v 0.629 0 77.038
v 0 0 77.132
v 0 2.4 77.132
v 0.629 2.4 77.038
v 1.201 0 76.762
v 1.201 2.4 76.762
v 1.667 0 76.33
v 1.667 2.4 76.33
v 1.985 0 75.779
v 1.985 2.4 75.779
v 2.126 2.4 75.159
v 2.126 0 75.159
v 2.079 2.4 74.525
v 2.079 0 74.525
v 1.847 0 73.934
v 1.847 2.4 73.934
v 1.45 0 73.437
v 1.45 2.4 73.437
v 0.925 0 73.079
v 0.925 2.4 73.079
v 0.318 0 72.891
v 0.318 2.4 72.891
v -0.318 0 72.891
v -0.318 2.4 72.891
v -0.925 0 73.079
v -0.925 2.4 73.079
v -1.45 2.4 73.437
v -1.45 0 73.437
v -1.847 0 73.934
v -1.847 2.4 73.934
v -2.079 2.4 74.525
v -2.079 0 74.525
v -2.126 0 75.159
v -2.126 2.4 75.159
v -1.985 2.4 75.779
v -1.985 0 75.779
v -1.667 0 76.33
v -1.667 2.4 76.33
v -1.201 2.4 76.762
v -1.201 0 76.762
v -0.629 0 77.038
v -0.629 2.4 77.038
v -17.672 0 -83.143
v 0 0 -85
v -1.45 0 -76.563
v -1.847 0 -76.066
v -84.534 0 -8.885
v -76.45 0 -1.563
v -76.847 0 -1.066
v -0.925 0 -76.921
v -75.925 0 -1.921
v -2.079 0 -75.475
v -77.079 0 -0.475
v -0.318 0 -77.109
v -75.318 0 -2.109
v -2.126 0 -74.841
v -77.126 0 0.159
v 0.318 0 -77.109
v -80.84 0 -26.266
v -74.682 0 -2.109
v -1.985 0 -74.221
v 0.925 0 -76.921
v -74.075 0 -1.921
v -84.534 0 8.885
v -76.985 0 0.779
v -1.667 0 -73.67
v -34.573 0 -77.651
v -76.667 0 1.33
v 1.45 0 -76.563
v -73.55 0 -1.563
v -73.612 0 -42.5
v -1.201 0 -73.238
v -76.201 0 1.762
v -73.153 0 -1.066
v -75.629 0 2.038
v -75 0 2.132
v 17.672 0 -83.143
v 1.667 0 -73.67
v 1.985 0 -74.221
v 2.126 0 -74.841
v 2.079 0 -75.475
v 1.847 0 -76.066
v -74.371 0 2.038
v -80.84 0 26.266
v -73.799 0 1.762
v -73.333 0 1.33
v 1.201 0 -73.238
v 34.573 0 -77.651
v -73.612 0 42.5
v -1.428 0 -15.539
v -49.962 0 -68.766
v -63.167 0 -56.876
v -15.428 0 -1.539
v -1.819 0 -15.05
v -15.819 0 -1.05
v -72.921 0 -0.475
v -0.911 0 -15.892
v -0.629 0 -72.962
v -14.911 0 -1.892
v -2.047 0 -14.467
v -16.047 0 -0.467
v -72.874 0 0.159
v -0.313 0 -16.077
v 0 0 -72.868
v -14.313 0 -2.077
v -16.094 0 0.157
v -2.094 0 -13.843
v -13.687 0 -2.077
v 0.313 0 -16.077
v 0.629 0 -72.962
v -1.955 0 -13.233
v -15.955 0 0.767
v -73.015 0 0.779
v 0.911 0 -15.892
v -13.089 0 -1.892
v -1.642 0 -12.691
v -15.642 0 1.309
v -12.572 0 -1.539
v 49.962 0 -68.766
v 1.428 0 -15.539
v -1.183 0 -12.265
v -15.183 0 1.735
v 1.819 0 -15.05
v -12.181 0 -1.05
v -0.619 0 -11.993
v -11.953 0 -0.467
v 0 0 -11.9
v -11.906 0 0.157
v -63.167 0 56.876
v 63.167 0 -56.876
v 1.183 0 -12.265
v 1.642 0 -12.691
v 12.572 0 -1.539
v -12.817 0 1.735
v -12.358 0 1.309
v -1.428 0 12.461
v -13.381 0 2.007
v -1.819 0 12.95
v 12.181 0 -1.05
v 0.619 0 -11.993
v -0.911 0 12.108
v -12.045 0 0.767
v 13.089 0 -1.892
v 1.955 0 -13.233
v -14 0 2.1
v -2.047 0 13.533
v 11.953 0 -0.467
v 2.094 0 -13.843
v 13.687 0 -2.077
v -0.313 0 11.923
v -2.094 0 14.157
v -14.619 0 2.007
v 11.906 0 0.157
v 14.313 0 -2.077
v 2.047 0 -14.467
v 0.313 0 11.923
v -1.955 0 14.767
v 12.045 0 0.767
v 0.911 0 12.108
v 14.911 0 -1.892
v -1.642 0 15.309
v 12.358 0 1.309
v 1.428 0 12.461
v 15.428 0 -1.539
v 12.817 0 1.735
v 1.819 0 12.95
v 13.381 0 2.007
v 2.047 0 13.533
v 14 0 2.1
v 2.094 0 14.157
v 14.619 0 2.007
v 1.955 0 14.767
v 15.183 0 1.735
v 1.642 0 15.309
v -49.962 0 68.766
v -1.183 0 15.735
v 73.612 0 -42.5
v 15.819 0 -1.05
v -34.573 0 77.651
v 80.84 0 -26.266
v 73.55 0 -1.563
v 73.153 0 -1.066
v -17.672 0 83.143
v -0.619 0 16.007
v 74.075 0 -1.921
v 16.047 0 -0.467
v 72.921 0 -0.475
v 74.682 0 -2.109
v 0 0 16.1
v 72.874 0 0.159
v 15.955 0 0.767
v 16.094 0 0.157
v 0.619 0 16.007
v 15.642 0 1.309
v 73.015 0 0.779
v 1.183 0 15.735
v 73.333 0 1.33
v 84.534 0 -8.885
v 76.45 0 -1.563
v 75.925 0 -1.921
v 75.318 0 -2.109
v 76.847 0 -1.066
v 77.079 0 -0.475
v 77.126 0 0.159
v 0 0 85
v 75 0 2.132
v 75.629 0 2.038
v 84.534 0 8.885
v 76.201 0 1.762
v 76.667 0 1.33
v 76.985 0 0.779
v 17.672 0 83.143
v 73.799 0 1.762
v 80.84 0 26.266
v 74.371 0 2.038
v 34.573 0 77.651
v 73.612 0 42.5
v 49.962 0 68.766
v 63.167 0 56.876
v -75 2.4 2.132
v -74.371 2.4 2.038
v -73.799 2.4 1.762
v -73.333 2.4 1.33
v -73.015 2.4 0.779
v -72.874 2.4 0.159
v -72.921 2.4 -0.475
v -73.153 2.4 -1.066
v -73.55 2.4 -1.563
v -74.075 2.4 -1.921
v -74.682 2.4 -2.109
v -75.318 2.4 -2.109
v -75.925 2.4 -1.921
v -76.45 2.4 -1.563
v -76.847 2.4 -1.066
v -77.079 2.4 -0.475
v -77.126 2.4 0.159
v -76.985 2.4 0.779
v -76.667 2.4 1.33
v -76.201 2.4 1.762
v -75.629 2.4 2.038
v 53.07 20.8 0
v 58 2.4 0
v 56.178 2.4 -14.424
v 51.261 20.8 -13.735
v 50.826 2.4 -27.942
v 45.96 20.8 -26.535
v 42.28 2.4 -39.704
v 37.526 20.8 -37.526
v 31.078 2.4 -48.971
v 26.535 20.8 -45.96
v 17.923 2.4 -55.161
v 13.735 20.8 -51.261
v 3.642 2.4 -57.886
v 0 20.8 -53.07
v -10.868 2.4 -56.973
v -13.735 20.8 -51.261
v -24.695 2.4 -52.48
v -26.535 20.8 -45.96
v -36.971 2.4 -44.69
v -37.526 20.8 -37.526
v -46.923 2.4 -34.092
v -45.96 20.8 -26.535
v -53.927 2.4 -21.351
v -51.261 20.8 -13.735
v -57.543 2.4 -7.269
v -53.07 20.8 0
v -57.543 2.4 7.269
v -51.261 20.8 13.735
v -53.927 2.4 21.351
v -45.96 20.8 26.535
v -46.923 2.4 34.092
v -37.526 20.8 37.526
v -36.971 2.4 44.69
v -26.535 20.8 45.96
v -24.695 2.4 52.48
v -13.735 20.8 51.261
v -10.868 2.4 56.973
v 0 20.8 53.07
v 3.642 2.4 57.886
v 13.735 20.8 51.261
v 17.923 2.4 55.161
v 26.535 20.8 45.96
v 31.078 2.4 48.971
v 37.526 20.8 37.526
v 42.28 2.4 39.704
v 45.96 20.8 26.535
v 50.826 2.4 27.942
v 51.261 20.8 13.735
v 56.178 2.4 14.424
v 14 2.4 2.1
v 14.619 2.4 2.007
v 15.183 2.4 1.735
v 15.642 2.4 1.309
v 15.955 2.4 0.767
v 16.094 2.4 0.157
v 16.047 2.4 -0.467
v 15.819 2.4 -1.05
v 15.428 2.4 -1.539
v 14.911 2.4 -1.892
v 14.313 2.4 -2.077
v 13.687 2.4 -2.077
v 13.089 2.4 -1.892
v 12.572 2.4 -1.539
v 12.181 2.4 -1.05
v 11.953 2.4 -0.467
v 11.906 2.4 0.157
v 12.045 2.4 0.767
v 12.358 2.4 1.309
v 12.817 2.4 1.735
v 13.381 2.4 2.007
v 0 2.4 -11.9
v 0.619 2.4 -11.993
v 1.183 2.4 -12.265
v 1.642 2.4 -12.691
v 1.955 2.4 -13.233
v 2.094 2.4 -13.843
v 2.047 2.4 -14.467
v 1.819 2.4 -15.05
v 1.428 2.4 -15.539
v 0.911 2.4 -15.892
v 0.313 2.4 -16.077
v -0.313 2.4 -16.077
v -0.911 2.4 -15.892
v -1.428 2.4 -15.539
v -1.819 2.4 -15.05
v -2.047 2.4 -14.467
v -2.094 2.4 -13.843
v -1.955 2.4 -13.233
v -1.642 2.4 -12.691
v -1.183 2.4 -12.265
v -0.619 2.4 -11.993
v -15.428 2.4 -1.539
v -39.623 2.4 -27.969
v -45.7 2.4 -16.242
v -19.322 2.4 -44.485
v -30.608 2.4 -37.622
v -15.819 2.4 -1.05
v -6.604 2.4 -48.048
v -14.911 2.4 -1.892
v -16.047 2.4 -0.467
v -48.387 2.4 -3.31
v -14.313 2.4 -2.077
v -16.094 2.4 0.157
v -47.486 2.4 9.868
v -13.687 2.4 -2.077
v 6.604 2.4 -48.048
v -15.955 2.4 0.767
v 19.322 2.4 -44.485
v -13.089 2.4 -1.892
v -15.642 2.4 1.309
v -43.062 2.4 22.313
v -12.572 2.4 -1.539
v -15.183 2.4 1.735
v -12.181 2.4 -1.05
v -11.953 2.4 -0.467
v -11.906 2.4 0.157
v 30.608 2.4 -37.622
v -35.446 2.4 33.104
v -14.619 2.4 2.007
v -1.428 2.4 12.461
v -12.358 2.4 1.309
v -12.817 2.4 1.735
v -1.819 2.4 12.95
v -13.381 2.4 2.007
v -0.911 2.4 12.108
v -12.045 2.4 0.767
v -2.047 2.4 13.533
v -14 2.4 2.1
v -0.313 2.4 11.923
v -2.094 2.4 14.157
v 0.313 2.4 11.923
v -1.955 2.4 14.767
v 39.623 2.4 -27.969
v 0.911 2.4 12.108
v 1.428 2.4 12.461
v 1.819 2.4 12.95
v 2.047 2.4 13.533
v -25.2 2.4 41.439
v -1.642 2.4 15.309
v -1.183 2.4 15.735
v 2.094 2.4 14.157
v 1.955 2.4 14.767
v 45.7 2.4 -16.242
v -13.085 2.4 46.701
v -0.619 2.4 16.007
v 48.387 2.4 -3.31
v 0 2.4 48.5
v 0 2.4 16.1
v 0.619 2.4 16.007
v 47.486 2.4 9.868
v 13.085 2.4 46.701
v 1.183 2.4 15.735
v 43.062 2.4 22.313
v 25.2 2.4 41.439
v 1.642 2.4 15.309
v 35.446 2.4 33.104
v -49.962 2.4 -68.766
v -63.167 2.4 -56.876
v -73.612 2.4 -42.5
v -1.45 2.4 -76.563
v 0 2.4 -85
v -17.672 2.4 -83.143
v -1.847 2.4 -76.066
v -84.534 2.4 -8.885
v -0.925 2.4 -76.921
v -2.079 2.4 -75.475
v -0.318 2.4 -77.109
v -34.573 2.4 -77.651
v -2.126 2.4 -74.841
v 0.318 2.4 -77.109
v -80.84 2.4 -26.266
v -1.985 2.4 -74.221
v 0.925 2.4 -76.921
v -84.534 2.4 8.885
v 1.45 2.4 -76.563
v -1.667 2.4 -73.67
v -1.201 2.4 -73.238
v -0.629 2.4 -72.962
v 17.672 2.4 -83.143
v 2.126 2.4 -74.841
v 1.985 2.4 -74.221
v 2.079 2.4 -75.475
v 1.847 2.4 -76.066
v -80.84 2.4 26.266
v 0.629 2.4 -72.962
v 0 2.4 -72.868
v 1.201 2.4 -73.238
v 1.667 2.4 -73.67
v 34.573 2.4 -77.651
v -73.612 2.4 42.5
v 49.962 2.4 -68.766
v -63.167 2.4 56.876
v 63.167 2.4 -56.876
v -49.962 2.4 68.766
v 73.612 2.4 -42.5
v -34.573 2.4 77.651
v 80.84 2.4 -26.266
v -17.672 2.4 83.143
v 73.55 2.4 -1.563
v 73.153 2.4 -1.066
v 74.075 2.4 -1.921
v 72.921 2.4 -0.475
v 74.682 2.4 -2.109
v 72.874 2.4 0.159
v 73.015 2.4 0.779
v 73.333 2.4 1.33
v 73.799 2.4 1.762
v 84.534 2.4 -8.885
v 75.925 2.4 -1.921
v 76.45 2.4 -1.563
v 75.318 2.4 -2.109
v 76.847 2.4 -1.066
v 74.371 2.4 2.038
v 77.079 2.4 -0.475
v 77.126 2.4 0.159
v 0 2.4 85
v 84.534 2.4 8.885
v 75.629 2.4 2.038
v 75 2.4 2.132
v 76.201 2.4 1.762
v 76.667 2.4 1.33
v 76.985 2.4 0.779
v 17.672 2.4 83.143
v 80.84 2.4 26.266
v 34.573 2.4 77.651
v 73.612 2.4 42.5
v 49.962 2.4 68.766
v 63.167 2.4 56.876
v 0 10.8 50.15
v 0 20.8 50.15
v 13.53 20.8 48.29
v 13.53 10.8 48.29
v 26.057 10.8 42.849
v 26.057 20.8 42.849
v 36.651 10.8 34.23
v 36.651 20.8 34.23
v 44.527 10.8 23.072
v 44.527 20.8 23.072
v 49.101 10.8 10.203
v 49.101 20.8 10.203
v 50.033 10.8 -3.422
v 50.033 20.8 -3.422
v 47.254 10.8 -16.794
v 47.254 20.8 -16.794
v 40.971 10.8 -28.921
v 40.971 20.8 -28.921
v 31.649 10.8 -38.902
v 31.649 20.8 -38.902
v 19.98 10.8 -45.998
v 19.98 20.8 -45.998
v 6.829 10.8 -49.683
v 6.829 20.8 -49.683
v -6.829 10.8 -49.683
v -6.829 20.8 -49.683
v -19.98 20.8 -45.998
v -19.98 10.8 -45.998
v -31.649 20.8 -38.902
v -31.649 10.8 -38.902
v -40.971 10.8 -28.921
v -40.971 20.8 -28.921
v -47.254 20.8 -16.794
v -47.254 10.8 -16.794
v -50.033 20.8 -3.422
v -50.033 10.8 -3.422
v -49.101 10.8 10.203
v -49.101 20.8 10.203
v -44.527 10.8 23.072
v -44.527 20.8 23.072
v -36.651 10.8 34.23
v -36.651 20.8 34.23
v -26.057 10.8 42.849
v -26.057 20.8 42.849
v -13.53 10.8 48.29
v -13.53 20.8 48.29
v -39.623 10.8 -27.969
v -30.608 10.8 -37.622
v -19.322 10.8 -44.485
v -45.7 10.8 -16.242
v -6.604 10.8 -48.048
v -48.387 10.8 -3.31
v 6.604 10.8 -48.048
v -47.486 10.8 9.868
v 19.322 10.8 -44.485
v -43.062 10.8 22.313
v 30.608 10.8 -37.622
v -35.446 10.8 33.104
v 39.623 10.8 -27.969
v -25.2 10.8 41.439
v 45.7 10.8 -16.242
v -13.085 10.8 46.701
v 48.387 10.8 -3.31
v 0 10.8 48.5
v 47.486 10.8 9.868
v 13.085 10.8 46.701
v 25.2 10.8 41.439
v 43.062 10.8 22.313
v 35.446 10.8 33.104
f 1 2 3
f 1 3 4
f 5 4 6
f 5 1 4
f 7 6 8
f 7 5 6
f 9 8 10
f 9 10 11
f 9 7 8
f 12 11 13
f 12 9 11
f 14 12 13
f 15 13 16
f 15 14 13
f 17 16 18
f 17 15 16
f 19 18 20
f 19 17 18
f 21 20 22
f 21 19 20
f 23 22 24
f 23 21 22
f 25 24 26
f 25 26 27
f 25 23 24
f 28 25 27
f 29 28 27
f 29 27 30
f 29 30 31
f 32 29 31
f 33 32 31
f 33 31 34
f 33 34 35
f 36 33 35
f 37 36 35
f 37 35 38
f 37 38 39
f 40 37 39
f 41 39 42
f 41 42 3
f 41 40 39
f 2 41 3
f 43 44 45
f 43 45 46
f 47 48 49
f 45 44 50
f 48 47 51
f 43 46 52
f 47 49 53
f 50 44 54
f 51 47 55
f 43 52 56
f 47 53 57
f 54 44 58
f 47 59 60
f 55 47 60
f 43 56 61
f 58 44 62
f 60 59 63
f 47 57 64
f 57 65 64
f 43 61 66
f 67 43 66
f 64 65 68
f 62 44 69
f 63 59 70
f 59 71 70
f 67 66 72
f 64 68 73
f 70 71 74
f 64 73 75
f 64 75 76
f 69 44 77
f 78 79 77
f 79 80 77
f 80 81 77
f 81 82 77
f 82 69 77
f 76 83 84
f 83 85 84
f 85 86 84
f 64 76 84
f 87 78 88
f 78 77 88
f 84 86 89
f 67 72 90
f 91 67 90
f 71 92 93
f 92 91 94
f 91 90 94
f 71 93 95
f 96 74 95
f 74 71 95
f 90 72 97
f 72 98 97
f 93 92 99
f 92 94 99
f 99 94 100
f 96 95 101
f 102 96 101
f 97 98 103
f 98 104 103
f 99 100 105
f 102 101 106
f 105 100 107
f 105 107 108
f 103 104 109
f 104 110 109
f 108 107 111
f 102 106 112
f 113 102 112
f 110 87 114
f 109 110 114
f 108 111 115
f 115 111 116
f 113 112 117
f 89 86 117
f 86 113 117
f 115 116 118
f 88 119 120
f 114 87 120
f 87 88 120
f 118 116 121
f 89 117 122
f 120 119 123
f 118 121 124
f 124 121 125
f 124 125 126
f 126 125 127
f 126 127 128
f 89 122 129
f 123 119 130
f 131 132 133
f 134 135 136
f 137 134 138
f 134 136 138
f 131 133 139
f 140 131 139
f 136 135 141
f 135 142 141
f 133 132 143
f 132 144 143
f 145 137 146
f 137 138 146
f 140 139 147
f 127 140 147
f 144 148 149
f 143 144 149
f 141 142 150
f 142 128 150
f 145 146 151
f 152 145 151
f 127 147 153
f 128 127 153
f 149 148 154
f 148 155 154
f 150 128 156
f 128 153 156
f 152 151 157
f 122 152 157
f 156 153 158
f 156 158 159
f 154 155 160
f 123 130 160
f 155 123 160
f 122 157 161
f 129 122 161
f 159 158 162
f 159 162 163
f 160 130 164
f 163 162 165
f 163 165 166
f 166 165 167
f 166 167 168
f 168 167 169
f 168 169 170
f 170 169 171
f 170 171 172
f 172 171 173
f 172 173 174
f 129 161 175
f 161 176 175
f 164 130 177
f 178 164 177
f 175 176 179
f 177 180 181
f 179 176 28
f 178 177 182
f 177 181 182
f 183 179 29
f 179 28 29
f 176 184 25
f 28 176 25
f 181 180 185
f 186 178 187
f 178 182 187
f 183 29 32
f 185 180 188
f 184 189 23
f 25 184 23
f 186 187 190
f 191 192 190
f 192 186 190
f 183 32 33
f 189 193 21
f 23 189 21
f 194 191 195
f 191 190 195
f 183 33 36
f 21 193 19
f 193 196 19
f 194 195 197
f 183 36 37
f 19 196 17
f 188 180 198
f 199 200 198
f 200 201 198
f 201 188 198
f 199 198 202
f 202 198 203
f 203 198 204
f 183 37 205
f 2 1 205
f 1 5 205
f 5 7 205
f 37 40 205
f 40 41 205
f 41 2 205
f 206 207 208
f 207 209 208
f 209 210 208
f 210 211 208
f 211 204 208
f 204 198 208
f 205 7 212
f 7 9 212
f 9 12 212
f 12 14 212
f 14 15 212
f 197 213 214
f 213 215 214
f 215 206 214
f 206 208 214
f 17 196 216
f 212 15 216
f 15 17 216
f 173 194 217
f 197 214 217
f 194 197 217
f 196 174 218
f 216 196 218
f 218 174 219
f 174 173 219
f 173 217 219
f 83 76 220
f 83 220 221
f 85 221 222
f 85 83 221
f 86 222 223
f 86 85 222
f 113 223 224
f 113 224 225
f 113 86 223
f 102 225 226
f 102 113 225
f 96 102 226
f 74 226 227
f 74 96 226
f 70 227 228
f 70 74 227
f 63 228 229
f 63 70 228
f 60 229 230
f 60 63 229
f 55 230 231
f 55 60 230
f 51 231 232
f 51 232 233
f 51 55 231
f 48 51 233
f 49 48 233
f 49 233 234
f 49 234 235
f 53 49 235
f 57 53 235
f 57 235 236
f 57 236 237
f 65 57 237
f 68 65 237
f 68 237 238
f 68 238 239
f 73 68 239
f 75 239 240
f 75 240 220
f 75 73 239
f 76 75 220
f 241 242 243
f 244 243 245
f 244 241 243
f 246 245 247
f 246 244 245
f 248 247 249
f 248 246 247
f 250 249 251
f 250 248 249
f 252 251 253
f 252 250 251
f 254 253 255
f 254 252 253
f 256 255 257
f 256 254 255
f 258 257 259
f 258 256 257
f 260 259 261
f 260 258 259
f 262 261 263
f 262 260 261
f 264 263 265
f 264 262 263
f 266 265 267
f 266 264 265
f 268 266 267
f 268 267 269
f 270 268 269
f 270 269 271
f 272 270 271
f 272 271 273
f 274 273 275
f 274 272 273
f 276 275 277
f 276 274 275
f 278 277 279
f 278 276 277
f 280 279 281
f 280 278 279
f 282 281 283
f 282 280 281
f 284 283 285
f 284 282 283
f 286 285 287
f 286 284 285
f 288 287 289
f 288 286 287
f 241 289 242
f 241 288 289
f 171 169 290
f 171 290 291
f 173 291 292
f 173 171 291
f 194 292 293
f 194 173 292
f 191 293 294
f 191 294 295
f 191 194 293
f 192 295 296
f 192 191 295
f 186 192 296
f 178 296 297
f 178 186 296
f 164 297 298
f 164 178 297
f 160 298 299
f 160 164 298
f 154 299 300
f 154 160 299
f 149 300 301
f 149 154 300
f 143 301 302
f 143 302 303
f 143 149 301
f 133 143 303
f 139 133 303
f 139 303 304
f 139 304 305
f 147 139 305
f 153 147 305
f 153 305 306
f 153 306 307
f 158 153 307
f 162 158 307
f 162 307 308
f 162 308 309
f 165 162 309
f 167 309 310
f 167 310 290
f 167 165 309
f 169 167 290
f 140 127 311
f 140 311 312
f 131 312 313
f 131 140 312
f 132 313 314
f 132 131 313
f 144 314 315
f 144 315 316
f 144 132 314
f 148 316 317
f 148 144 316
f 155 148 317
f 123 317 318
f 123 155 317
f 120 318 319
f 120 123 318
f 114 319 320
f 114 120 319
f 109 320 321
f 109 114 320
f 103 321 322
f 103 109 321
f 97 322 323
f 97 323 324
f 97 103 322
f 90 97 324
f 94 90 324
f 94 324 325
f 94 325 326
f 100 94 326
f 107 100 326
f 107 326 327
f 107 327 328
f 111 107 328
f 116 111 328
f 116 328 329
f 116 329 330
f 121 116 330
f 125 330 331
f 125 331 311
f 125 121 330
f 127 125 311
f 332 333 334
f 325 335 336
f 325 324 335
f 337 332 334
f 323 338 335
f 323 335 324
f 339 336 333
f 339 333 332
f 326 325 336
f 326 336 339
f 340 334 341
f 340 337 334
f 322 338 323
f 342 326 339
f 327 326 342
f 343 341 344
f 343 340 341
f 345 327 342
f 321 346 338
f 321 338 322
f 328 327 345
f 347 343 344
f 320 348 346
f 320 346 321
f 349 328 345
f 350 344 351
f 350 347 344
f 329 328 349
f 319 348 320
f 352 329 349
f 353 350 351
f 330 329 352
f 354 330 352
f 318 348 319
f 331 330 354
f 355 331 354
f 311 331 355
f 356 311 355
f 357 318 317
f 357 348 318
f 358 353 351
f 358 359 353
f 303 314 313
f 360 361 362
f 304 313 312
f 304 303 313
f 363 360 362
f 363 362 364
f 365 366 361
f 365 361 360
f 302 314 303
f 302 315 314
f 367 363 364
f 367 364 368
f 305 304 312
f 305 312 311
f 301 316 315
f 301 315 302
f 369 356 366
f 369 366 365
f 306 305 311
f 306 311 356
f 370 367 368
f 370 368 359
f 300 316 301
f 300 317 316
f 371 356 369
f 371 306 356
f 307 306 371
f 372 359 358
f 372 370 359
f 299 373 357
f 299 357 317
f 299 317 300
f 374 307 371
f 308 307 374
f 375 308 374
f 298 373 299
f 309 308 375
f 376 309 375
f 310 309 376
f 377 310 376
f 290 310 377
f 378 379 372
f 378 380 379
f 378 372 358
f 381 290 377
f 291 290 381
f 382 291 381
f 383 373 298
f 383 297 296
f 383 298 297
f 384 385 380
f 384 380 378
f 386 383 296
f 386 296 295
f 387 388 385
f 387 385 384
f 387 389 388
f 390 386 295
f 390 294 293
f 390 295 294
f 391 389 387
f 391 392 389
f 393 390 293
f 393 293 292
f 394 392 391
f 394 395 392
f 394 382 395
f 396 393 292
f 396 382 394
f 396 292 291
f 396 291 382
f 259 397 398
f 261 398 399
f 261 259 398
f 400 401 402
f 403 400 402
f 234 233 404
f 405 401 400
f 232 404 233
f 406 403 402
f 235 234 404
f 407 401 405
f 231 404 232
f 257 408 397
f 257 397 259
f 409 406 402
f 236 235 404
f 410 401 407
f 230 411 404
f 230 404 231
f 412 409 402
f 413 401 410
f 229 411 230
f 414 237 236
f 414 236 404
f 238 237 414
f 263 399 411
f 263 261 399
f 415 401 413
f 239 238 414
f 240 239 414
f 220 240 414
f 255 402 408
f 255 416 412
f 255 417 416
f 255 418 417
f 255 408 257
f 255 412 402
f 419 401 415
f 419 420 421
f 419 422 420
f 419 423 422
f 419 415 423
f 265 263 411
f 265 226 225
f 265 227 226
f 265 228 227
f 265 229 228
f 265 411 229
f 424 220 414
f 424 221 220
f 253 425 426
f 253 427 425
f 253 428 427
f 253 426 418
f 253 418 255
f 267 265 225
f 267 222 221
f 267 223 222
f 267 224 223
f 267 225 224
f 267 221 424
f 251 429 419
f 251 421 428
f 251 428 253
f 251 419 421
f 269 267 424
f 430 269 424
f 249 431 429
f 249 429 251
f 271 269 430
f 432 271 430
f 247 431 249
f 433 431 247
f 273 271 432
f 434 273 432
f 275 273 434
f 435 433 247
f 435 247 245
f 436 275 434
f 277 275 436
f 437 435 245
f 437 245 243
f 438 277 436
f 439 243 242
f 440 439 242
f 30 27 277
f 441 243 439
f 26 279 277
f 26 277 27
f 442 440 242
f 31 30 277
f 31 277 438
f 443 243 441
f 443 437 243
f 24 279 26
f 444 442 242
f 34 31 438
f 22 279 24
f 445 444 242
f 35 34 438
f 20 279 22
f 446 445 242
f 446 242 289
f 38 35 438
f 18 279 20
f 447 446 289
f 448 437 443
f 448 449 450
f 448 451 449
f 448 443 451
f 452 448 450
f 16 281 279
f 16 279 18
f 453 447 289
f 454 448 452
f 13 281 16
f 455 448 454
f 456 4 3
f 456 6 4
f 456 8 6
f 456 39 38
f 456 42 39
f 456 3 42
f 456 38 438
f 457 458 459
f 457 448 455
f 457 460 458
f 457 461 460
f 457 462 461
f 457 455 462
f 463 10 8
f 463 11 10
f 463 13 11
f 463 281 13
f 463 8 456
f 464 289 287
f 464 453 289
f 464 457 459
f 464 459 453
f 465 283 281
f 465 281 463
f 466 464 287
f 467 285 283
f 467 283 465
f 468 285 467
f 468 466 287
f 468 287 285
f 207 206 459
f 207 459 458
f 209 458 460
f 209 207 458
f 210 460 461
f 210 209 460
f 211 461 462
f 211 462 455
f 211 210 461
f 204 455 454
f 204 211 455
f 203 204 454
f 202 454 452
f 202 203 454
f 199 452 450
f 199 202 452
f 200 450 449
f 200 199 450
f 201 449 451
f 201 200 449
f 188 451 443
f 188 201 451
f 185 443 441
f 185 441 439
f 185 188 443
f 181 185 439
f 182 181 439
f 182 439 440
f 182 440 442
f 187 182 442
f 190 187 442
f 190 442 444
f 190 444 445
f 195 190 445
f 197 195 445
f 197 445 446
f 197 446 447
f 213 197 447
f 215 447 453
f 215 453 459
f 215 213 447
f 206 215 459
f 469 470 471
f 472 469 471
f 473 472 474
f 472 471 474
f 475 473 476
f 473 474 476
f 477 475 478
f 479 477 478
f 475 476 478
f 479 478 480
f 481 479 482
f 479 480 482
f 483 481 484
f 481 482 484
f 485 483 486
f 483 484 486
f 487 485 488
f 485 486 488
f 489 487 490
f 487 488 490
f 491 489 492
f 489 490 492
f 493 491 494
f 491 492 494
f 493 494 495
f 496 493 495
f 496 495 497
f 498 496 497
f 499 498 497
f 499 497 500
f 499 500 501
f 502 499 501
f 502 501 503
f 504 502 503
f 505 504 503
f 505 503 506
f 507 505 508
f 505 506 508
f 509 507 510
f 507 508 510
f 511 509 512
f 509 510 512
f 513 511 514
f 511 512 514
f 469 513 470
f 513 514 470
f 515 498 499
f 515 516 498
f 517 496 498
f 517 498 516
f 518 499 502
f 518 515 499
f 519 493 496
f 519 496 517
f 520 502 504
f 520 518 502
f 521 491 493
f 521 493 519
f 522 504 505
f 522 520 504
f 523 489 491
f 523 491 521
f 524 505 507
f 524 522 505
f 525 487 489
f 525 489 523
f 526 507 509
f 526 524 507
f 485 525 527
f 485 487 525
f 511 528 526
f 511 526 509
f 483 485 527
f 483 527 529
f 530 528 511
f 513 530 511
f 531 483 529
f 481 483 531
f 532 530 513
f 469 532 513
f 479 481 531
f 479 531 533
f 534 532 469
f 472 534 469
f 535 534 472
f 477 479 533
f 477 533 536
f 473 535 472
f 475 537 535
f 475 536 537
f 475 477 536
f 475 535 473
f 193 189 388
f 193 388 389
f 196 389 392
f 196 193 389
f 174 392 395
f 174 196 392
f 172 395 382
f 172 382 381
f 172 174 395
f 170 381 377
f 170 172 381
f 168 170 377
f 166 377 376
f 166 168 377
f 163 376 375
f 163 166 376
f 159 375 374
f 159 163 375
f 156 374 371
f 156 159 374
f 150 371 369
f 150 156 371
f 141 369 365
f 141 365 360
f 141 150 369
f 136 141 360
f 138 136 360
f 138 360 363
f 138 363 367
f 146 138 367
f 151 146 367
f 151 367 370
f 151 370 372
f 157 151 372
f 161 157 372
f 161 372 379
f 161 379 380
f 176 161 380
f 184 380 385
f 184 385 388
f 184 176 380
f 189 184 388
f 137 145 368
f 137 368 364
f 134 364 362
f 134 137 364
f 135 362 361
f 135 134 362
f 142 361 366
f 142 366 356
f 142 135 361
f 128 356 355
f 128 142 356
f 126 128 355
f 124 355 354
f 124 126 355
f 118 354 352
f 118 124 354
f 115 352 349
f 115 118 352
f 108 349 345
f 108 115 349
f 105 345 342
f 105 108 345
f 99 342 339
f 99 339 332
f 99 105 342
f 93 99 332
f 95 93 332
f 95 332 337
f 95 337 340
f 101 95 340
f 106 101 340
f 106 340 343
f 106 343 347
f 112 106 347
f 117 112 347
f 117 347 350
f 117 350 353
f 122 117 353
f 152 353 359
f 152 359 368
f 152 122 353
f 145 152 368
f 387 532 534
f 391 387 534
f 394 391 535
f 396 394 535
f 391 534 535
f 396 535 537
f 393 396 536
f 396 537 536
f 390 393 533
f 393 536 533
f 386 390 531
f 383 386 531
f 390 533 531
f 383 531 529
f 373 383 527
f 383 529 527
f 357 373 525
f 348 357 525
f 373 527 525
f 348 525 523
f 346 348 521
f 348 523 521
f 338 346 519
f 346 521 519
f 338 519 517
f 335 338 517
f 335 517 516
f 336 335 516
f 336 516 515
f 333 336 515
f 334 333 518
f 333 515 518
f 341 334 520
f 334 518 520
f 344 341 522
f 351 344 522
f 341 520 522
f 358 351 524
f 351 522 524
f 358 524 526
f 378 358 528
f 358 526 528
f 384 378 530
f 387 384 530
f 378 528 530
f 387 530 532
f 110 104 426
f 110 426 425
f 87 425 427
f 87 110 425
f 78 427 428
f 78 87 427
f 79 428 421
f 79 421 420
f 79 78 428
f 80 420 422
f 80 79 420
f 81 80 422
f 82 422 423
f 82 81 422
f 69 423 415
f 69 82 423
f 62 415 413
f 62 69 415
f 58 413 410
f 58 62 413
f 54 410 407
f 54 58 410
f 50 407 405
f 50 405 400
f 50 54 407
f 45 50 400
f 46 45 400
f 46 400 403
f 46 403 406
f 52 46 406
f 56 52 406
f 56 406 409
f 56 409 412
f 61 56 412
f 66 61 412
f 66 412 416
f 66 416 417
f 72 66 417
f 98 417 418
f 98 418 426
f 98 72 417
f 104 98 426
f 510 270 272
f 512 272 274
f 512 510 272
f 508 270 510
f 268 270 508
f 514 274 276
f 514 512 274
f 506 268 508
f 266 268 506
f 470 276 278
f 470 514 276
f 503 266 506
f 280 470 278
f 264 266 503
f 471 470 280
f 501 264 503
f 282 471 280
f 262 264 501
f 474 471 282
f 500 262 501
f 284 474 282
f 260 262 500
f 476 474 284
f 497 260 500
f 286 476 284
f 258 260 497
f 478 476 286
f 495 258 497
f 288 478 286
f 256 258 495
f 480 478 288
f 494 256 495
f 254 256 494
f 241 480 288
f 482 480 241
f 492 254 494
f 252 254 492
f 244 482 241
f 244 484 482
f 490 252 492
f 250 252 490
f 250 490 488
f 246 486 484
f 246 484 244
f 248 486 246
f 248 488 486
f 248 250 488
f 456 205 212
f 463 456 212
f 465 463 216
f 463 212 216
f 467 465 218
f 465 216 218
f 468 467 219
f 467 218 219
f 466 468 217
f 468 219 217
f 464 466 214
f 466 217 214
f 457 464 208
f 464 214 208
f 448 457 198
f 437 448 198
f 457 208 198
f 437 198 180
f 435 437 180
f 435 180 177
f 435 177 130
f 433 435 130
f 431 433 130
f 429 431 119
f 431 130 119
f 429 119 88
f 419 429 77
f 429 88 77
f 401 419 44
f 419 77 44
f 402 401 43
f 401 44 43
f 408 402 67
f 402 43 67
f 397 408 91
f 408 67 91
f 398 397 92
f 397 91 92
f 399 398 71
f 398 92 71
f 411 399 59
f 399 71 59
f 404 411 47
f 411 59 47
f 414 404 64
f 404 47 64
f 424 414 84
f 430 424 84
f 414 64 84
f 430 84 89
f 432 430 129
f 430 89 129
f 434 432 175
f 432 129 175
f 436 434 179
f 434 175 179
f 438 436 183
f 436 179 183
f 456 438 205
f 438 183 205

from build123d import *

# Parameters (mm, degrees)
SKETCH1_R           = 85
SKETCH1_R_2         = 2.132457031
SKETCH1_R_3         = 2.1
BOSS_EXTRUDE1_DEPTH = 2.4
SKETCH2_R           = 58
BOSS_EXTRUDE2_DEPTH = 18.4
BOSS_EXTRUDE2_TAPER = 15
SKETCH3_R           = 50.15
CUT_EXTRUDE1_DEPTH  = 10
SKETCH4_R           = 48.5
CUT_EXTRUDE2_DEPTH  = 8.4


with BuildPart() as part:
    # Sketch1 → Boss-Extrude1 (new body)
    with BuildSketch(Plane(origin=(0, 0, 0), x_dir=(1, 0, 0), z_dir=(0, 1, 0))):
        with Locations(Location((0, 0, 0), (0, 0, 270))):
            Circle(SKETCH1_R)
        with Locations(Location((-75, 0, 0), (0, 0, 270))):
            Circle(SKETCH1_R_2, mode=Mode.SUBTRACT)
        with Locations(Location((0, 75, 0), (0, 0, 270))):
            Circle(SKETCH1_R_2, mode=Mode.SUBTRACT)
        with Locations(Location((75, 0, 0), (0, 0, 270))):
            Circle(SKETCH1_R_2, mode=Mode.SUBTRACT)
        with Locations(Location((0, -75, 0), (0, 0, 270))):
            Circle(SKETCH1_R_2, mode=Mode.SUBTRACT)
        with Locations(Location((-14, 0, 0), (0, 0, 270))):
            Circle(SKETCH1_R_3, mode=Mode.SUBTRACT)
        with Locations(Location((0, 14, 0), (0, 0, 270))):
            Circle(SKETCH1_R_3, mode=Mode.SUBTRACT)
        with Locations(Location((14, 0, 0), (0, 0, 270))):
            Circle(SKETCH1_R_3, mode=Mode.SUBTRACT)
        with Locations(Location((0, -14, 0), (0, 0, 270))):
            Circle(SKETCH1_R_3, mode=Mode.SUBTRACT)
    extrude(amount=BOSS_EXTRUDE1_DEPTH)

    # Sketch2 → Boss-Extrude2 (add)
    with BuildSketch(Plane(origin=(0, 2.4, 0), x_dir=(1, 0, 0), z_dir=(0, 1, 0))):
        Circle(SKETCH2_R)
    extrude(amount=BOSS_EXTRUDE2_DEPTH, taper=BOSS_EXTRUDE2_TAPER)

    # Sketch3 → Cut-Extrude1 (cut)
    with BuildSketch(Plane(origin=(0, 20.8, 0), x_dir=(1, 0, 0), z_dir=(0, 1, 0))):
        with Locations(Location((0, 0, 0), (0, 0, 270))):
            Circle(SKETCH3_R)
    extrude(amount=-CUT_EXTRUDE1_DEPTH, mode=Mode.SUBTRACT)

    # Sketch4 → Cut-Extrude2 (cut)
    with BuildSketch(Plane(origin=(0, 10.8, 0), x_dir=(1, 0, 0), z_dir=(0, 1, 0))):
        with Locations(Location((0, 0, 0), (0, 0, 270))):
            Circle(SKETCH4_R)
    extrude(amount=-CUT_EXTRUDE2_DEPTH, mode=Mode.SUBTRACT)


solid = part.part
